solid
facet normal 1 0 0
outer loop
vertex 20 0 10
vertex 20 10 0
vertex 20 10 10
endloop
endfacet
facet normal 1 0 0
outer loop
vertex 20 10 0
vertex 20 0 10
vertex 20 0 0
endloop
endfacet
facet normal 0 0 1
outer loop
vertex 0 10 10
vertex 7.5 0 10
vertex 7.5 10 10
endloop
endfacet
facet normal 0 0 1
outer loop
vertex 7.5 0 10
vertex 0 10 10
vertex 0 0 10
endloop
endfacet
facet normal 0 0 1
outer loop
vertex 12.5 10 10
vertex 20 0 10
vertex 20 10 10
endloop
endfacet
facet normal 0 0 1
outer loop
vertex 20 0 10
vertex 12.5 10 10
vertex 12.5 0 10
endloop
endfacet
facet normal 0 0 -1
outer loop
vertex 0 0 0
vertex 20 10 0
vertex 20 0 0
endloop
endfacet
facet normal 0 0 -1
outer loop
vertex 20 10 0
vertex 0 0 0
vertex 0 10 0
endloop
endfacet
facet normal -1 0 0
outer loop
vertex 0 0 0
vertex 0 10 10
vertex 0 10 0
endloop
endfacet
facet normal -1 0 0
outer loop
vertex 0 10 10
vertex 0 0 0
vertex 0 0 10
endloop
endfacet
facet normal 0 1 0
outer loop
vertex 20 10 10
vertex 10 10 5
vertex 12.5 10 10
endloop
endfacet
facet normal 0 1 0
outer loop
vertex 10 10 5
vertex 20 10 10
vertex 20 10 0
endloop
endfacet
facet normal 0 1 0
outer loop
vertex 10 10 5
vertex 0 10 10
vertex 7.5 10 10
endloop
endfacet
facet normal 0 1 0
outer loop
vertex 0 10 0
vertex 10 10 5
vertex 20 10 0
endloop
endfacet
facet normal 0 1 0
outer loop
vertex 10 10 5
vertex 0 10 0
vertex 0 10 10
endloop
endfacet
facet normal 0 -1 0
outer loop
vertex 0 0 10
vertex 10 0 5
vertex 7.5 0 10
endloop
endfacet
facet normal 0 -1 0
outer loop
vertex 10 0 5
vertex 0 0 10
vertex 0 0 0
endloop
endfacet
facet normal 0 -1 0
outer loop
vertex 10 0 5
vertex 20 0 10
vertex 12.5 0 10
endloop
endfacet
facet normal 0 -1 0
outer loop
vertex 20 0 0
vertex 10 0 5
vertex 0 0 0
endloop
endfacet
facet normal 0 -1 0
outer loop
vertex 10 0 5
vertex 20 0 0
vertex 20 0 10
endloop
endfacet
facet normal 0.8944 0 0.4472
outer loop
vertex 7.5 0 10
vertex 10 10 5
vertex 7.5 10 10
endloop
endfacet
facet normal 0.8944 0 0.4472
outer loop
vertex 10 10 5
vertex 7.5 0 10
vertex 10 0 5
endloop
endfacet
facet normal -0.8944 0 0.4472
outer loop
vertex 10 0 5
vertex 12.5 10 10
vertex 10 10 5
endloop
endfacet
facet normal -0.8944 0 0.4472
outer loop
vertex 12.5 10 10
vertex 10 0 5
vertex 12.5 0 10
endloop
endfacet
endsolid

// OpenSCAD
difference() {
	cube([20, 10, 10]);
	translate([10, -1, 5]) {
		scale([1, 1, 2]) {
			rotate([0, -45, 0]) {
				cube(12);
			}
		}
	}
}
